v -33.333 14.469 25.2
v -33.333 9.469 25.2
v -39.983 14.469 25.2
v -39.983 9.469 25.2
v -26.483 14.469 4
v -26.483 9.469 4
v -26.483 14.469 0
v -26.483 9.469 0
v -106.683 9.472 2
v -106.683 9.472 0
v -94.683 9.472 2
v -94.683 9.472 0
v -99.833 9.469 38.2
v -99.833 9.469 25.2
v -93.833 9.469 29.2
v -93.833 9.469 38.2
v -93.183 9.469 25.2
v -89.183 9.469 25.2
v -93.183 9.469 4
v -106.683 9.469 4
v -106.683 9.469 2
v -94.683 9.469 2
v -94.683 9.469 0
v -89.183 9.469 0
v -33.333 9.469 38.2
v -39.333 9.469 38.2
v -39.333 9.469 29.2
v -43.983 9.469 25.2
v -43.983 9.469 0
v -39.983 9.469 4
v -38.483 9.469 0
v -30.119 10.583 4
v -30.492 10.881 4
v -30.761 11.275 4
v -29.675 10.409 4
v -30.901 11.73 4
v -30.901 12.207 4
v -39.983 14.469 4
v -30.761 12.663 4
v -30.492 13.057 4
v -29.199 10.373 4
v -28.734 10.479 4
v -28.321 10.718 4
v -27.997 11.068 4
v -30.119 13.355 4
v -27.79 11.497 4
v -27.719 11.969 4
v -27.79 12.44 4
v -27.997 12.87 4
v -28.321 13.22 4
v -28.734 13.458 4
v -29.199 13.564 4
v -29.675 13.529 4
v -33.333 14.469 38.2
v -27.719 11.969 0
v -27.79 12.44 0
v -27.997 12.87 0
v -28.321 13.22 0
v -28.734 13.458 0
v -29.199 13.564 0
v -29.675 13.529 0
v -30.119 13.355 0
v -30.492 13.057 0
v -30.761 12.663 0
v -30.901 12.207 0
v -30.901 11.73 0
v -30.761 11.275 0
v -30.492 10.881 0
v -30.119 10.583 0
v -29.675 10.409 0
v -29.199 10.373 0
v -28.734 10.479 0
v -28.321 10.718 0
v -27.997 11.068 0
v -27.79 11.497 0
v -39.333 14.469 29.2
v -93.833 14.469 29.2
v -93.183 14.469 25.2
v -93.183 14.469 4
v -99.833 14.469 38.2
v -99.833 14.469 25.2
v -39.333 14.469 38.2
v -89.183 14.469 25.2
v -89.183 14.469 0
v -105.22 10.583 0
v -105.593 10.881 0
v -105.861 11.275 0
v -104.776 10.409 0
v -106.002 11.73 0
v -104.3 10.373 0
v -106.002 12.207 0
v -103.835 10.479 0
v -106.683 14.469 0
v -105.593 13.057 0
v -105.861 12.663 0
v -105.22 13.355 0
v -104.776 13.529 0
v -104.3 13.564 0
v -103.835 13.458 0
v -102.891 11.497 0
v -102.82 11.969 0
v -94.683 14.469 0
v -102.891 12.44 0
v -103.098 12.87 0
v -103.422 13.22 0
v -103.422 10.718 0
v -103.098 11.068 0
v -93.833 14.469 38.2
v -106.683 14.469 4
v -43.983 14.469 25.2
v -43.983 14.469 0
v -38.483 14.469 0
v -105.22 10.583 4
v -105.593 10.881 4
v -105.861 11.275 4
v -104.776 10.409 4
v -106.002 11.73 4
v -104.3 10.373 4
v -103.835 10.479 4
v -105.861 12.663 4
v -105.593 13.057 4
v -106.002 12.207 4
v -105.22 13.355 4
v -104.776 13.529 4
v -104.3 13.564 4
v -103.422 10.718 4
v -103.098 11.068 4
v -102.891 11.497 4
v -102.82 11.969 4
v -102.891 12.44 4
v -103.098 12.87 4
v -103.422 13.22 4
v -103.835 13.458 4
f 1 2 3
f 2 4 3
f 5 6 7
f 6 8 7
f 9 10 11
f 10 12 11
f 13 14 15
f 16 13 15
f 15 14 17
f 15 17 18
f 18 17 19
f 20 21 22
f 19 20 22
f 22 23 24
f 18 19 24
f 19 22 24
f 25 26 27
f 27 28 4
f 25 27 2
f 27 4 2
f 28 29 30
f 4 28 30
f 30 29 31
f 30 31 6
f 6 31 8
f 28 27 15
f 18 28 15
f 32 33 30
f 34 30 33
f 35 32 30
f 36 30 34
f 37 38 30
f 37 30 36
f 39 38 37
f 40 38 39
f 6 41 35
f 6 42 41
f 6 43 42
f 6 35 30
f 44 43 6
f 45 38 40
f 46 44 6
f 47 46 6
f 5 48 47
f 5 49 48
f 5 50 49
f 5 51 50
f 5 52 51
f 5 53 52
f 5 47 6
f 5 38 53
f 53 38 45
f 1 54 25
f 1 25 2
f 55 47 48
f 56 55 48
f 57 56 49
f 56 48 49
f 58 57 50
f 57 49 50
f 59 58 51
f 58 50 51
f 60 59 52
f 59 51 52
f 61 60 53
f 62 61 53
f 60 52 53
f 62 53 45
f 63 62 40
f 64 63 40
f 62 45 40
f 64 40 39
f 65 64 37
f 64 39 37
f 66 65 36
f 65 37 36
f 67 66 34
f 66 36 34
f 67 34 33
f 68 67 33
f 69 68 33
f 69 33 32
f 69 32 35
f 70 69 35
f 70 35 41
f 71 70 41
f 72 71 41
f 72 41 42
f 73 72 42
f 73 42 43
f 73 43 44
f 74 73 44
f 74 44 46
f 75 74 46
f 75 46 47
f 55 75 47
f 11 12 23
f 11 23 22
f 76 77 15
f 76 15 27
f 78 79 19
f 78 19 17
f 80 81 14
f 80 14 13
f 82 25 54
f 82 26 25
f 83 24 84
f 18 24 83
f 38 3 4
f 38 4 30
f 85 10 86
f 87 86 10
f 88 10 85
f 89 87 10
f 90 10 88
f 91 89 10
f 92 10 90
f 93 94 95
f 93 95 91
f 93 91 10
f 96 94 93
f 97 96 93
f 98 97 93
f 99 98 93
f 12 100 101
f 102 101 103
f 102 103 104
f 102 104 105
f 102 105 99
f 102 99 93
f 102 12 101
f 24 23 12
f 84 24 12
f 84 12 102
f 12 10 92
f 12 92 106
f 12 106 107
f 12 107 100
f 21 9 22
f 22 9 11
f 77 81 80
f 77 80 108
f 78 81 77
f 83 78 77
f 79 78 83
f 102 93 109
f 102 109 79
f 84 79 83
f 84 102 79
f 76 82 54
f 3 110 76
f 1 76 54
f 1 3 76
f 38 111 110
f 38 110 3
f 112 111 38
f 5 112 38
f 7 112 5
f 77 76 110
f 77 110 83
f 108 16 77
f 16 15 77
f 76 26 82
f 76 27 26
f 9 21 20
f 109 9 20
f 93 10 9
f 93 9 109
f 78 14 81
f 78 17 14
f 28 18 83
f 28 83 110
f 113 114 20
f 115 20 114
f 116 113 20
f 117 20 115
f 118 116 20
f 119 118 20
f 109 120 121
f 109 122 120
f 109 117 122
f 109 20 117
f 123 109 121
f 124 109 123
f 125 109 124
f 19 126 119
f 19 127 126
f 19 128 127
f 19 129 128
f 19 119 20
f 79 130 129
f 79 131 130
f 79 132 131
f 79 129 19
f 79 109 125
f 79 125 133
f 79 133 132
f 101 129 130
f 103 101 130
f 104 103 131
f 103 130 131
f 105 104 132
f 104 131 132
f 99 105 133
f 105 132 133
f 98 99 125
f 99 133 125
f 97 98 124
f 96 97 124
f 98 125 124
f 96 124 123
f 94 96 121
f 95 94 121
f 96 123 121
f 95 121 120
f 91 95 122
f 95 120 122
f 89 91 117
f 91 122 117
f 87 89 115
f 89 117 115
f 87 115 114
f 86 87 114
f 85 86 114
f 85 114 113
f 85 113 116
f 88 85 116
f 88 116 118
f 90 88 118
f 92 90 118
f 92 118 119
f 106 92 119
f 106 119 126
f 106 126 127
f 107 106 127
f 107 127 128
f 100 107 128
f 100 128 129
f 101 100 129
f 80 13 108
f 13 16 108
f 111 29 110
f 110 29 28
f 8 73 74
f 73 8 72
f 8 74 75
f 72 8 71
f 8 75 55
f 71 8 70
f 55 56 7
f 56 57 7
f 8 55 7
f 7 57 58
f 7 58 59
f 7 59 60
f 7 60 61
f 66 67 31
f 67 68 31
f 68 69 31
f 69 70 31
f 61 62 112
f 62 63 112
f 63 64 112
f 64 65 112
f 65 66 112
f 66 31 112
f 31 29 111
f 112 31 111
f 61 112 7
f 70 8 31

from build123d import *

# Parameters (mm, degrees)
SKETCH1_W            = 50.2
SKETCH1_H            = 5
BOSS_EXTRUDE1_DEPTH  = 26.2
SKETCH2_W            = 45.2
SKETCH2_H            = 23.699783527
CUT_EXTRUDE1_DEPTH   = 26.2
SKETCH4_W            = 1.5
SKETCH4_H            = 24.2
CUT_EXTRUDE2_DEPTH   = 26.2
SKETCH5_W            = 2
SKETCH5_H            = 5
BOSS_EXTRUDE2_DEPTH  = 3
SKETCH7_W            = 1.5
SKETCH7_H            = 24.2
CUT_EXTRUDE3_DEPTH   = 23
SKETCH8_W            = 45.2
SKETCH8_H            = 1.5
CUT_EXTRUDE4_DEPTH   = 23
SKETCH9_W            = 2
SKETCH9_H            = 5
BOSS_EXTRUDE3_DEPTH  = 3
SKETCH11_W           = 2
SKETCH11_H           = 5
BOSS_EXTRUDE4_DEPTH  = 2
SKETCH12_W           = 2
SKETCH12_H           = 4.997290344
BOSS_EXTRUDE5_DEPTH  = 2
SKETCH15_W           = 1
SKETCH15_H           = 5
BOSS_EXTRUDE6_DEPTH  = 4.65
SKETCH16_W           = 1
SKETCH16_H           = 5
BOSS_EXTRUDE7_DEPTH  = 4.65
SKETCH17_W           = 1
SKETCH17_H           = 5
BOSS_EXTRUDE8_DEPTH  = 9
SKETCH18_W           = 1
SKETCH18_H           = 5
BOSS_EXTRUDE9_DEPTH  = 9
SKETCH20_W           = 10
SKETCH20_H           = 5
BOSS_EXTRUDE10_DEPTH = 2
SKETCH21_W           = 10
SKETCH21_H           = 5
BOSS_EXTRUDE11_DEPTH = 2
SKETCH22_W           = 23.2
SKETCH22_H           = 5
BOSS_EXTRUDE12_DEPTH = 3
SKETCH23_W           = 23.2
SKETCH23_H           = 5
BOSS_EXTRUDE13_DEPTH = 3
SKETCH24_W           = 54.5
SKETCH24_H           = 5
BOSS_EXTRUDE14_DEPTH = 3
SKETCH25_W           = 3
SKETCH25_H           = 5
BOSS_EXTRUDE15_DEPTH = 3
SKETCH26_W           = 3
SKETCH26_H           = 5
BOSS_EXTRUDE16_DEPTH = 3
SKETCH27_W           = 13
SKETCH27_H           = 5
BOSS_EXTRUDE17_DEPTH = 3
SKETCH28_W           = 13
SKETCH28_H           = 5
BOSS_EXTRUDE18_DEPTH = 3
SKETCH29_W           = 2
SKETCH29_H           = 5
BOSS_EXTRUDE21_DEPTH = 10
SKETCH30_W           = 2
SKETCH30_H           = 4.997290344
BOSS_EXTRUDE22_DEPTH = 10
SKETCH31_W           = 13.5
SKETCH31_H           = 5
BOSS_EXTRUDE23_DEPTH = 2
SKETCH32_W           = 13.5
SKETCH32_H           = 5
BOSS_EXTRUDE24_DEPTH = 2
SKETCH33_R           = 1.6
CUT_EXTRUDE5_DEPTH   = 12
SKETCH34_R           = 1.6
CUT_EXTRUDE6_DEPTH   = 12


with BuildPart() as part:
    # Sketch1 → Boss-Extrude1 (new body)
    with BuildSketch(Plane.XY):
        with Locations((-66.582634731, 11.968862275)):
            Rectangle(SKETCH1_W, SKETCH1_H)
    extrude(amount=BOSS_EXTRUDE1_DEPTH)

    # Sketch2 → Cut-Extrude1 (cut)
    with BuildSketch(Plane.XZ.offset(-9.468862275)):
        with Locations((-66.582634731, 11.849891764)):
            Rectangle(SKETCH2_W, SKETCH2_H)
    extrude(amount=-CUT_EXTRUDE1_DEPTH, mode=Mode.SUBTRACT)

    # Sketch4 → Cut-Extrude2 (cut)
    with BuildSketch(Plane.XZ.offset(-9.468862275)):
        with Locations((-90.932634731, 14.1)):
            Rectangle(SKETCH4_W, SKETCH4_H)
    extrude(amount=-CUT_EXTRUDE2_DEPTH, mode=Mode.SUBTRACT)

    # Sketch5 → Boss-Extrude2 (add)
    with BuildSketch(Plane.ZY.offset(91.682634731)):
        with Locations((1, 11.968862275)):
            Rectangle(SKETCH5_W, SKETCH5_H)
    extrude(amount=BOSS_EXTRUDE2_DEPTH)

    # Sketch7 → Cut-Extrude3 (cut)
    with BuildSketch(Plane.XZ.offset(-9.468862275)):
        with Locations((-42.232634731, 14.1)):
            Rectangle(SKETCH7_W, SKETCH7_H)
    extrude(amount=-CUT_EXTRUDE3_DEPTH, mode=Mode.SUBTRACT)

    # Sketch8 → Cut-Extrude4 (cut)
    with BuildSketch(Plane.XZ.offset(-9.468862275)):
        with Locations((-66.582634731, 24.449783527)):
            Rectangle(SKETCH8_W, SKETCH8_H)
    extrude(amount=-CUT_EXTRUDE4_DEPTH, mode=Mode.SUBTRACT)

    # Sketch9 → Boss-Extrude3 (add)
    with BuildSketch(Plane(origin=(-41.482634731, 0, 0), x_dir=(0, 0, -1), z_dir=(1, 0, 0))):
        with Locations((-1, 11.968862275)):
            Rectangle(SKETCH9_W, SKETCH9_H)
    extrude(amount=BOSS_EXTRUDE3_DEPTH)

    # Sketch11 → Boss-Extrude4 (add)
    with BuildSketch(Plane(origin=(-38.482634731, 0, 0), x_dir=(0, 0, -1), z_dir=(1, 0, 0))):
        with Locations((-1, 11.968862275)):
            Rectangle(SKETCH11_W, SKETCH11_H)
    extrude(amount=BOSS_EXTRUDE4_DEPTH)

    # Sketch15 → Boss-Extrude6 (add)
    with BuildSketch(Plane.ZY.offset(90.182634731)):
        with Locations((25.7, 11.968862275)):
            Rectangle(SKETCH15_W, SKETCH15_H)
    extrude(amount=BOSS_EXTRUDE6_DEPTH)

    # Sketch16 → Boss-Extrude7 (add)
    with BuildSketch(Plane(origin=(-42.982634731, 0, 0), x_dir=(0, 0, -1), z_dir=(1, 0, 0))):
        with Locations((-25.7, 11.968862275)):
            Rectangle(SKETCH16_W, SKETCH16_H)
    extrude(amount=BOSS_EXTRUDE7_DEPTH)

    # Sketch17 → Boss-Extrude8 (add)
    with BuildSketch(Plane.XY.offset(26.2)):
        with Locations((-38.832634731, 11.968862275)):
            Rectangle(SKETCH17_W, SKETCH17_H)
    extrude(amount=BOSS_EXTRUDE8_DEPTH)

    # Sketch18 → Boss-Extrude9 (add)
    with BuildSketch(Plane.XY.offset(26.2)):
        with Locations((-94.332634731, 11.968862275)):
            Rectangle(SKETCH18_W, SKETCH18_H)
    extrude(amount=BOSS_EXTRUDE9_DEPTH)

    # Sketch20 → Boss-Extrude10 (add)
    with BuildSketch(Plane.ZY.offset(94.832634731)):
        with Locations((30.2, 11.968862275)):
            Rectangle(SKETCH20_W, SKETCH20_H)
    extrude(amount=BOSS_EXTRUDE10_DEPTH)

    # Sketch21 → Boss-Extrude11 (add)
    with BuildSketch(Plane(origin=(-38.332634731, 0, 0), x_dir=(0, 0, -1), z_dir=(1, 0, 0))):
        with Locations((-30.2, 11.968862275)):
            Rectangle(SKETCH21_W, SKETCH21_H)
    extrude(amount=BOSS_EXTRUDE11_DEPTH)

    # Sketch22 → Boss-Extrude12 (add)
    with BuildSketch(Plane.ZY.offset(90.182634731)):
        with Locations((13.6, 11.968862275)):
            Rectangle(SKETCH22_W, SKETCH22_H)
    extrude(amount=BOSS_EXTRUDE12_DEPTH)

    # Sketch23 → Boss-Extrude13 (add)
    with BuildSketch(Plane(origin=(-42.982634731, 0, 0), x_dir=(0, 0, -1), z_dir=(1, 0, 0))):
        with Locations((-13.6, 11.968862275)):
            Rectangle(SKETCH23_W, SKETCH23_H)
    extrude(amount=BOSS_EXTRUDE13_DEPTH)

    # Sketch24 → Boss-Extrude14 (add)
    with BuildSketch(Plane.XY.offset(26.2)):
        with Locations((-66.582634731, 11.968862275)):
            Rectangle(SKETCH24_W, SKETCH24_H)
    extrude(amount=BOSS_EXTRUDE14_DEPTH)

    # Sketch25 → Boss-Extrude15 (add)
    with BuildSketch(Plane.XY.offset(35.2)):
        with Locations((-37.832634731, 11.968862275)):
            Rectangle(SKETCH25_W, SKETCH25_H)
    extrude(amount=BOSS_EXTRUDE15_DEPTH)

    # Sketch26 → Boss-Extrude16 (add)
    with BuildSketch(Plane.XY.offset(35.2)):
        with Locations((-95.332634731, 11.968862275)):
            Rectangle(SKETCH26_W, SKETCH26_H)
    extrude(amount=BOSS_EXTRUDE16_DEPTH)

    # Sketch27 → Boss-Extrude17 (add)
    with BuildSketch(Plane.ZY.offset(96.832634731)):
        with Locations((31.7, 11.968862275)):
            Rectangle(SKETCH27_W, SKETCH27_H)
    extrude(amount=BOSS_EXTRUDE17_DEPTH)

    # Sketch28 → Boss-Extrude18 (add)
    with BuildSketch(Plane(origin=(-36.332634731, 0, 0), x_dir=(0, 0, -1), z_dir=(1, 0, 0))):
        with Locations((-31.7, 11.968862275)):
            Rectangle(SKETCH28_W, SKETCH28_H)
    extrude(amount=BOSS_EXTRUDE18_DEPTH)

    # Sketch29 → Boss-Extrude21 (add)
    with BuildSketch(Plane(origin=(-36.482634731, 0, 0), x_dir=(0, 0, -1), z_dir=(1, 0, 0))):
        with Locations((-1, 11.968862275)):
            Rectangle(SKETCH29_W, SKETCH29_H)
    extrude(amount=BOSS_EXTRUDE21_DEPTH)


with BuildPart() as body_2:
    # Sketch12 → Boss-Extrude5 (new body)
    with BuildSketch(Plane.ZY.offset(94.682634731)):
        with Locations((1, 11.970217103)):
            Rectangle(SKETCH12_W, SKETCH12_H)
    extrude(amount=BOSS_EXTRUDE5_DEPTH)


    add(part.part)  # Boss-Extrude22 merges part
    # Sketch30 → Boss-Extrude22 (add)
    with BuildSketch(Plane.ZY.offset(96.682634731)):
        with Locations((1, 11.970217103)):
            Rectangle(SKETCH30_W, SKETCH30_H)
    extrude(amount=BOSS_EXTRUDE22_DEPTH)

    # Sketch31 → Boss-Extrude23 (add)
    with BuildSketch(Plane.XY.offset(2)):
        with Locations((-99.932634731, 11.968862275)):
            Rectangle(SKETCH31_W, SKETCH31_H)
    extrude(amount=BOSS_EXTRUDE23_DEPTH)

    # Sketch32 → Boss-Extrude24 (add)
    with BuildSketch(Plane.XY.offset(2)):
        with Locations((-33.232634731, 11.968862275)):
            Rectangle(SKETCH32_W, SKETCH32_H)
    extrude(amount=BOSS_EXTRUDE24_DEPTH)

    # Sketch33 → Cut-Extrude5 (cut)
    with BuildSketch(Plane.XY.offset(4)):
        with Locations((-104.419830922, 11.968862275)):
            Circle(SKETCH33_R)
    extrude(amount=-CUT_EXTRUDE5_DEPTH, mode=Mode.SUBTRACT)

    # Sketch34 → Cut-Extrude6 (cut)
    with BuildSketch(Plane.XY.offset(4)):
        with Locations((-29.31902414, 11.968862275)):
            Circle(SKETCH34_R)
    extrude(amount=-CUT_EXTRUDE6_DEPTH, mode=Mode.SUBTRACT)


solid = body_2.part
